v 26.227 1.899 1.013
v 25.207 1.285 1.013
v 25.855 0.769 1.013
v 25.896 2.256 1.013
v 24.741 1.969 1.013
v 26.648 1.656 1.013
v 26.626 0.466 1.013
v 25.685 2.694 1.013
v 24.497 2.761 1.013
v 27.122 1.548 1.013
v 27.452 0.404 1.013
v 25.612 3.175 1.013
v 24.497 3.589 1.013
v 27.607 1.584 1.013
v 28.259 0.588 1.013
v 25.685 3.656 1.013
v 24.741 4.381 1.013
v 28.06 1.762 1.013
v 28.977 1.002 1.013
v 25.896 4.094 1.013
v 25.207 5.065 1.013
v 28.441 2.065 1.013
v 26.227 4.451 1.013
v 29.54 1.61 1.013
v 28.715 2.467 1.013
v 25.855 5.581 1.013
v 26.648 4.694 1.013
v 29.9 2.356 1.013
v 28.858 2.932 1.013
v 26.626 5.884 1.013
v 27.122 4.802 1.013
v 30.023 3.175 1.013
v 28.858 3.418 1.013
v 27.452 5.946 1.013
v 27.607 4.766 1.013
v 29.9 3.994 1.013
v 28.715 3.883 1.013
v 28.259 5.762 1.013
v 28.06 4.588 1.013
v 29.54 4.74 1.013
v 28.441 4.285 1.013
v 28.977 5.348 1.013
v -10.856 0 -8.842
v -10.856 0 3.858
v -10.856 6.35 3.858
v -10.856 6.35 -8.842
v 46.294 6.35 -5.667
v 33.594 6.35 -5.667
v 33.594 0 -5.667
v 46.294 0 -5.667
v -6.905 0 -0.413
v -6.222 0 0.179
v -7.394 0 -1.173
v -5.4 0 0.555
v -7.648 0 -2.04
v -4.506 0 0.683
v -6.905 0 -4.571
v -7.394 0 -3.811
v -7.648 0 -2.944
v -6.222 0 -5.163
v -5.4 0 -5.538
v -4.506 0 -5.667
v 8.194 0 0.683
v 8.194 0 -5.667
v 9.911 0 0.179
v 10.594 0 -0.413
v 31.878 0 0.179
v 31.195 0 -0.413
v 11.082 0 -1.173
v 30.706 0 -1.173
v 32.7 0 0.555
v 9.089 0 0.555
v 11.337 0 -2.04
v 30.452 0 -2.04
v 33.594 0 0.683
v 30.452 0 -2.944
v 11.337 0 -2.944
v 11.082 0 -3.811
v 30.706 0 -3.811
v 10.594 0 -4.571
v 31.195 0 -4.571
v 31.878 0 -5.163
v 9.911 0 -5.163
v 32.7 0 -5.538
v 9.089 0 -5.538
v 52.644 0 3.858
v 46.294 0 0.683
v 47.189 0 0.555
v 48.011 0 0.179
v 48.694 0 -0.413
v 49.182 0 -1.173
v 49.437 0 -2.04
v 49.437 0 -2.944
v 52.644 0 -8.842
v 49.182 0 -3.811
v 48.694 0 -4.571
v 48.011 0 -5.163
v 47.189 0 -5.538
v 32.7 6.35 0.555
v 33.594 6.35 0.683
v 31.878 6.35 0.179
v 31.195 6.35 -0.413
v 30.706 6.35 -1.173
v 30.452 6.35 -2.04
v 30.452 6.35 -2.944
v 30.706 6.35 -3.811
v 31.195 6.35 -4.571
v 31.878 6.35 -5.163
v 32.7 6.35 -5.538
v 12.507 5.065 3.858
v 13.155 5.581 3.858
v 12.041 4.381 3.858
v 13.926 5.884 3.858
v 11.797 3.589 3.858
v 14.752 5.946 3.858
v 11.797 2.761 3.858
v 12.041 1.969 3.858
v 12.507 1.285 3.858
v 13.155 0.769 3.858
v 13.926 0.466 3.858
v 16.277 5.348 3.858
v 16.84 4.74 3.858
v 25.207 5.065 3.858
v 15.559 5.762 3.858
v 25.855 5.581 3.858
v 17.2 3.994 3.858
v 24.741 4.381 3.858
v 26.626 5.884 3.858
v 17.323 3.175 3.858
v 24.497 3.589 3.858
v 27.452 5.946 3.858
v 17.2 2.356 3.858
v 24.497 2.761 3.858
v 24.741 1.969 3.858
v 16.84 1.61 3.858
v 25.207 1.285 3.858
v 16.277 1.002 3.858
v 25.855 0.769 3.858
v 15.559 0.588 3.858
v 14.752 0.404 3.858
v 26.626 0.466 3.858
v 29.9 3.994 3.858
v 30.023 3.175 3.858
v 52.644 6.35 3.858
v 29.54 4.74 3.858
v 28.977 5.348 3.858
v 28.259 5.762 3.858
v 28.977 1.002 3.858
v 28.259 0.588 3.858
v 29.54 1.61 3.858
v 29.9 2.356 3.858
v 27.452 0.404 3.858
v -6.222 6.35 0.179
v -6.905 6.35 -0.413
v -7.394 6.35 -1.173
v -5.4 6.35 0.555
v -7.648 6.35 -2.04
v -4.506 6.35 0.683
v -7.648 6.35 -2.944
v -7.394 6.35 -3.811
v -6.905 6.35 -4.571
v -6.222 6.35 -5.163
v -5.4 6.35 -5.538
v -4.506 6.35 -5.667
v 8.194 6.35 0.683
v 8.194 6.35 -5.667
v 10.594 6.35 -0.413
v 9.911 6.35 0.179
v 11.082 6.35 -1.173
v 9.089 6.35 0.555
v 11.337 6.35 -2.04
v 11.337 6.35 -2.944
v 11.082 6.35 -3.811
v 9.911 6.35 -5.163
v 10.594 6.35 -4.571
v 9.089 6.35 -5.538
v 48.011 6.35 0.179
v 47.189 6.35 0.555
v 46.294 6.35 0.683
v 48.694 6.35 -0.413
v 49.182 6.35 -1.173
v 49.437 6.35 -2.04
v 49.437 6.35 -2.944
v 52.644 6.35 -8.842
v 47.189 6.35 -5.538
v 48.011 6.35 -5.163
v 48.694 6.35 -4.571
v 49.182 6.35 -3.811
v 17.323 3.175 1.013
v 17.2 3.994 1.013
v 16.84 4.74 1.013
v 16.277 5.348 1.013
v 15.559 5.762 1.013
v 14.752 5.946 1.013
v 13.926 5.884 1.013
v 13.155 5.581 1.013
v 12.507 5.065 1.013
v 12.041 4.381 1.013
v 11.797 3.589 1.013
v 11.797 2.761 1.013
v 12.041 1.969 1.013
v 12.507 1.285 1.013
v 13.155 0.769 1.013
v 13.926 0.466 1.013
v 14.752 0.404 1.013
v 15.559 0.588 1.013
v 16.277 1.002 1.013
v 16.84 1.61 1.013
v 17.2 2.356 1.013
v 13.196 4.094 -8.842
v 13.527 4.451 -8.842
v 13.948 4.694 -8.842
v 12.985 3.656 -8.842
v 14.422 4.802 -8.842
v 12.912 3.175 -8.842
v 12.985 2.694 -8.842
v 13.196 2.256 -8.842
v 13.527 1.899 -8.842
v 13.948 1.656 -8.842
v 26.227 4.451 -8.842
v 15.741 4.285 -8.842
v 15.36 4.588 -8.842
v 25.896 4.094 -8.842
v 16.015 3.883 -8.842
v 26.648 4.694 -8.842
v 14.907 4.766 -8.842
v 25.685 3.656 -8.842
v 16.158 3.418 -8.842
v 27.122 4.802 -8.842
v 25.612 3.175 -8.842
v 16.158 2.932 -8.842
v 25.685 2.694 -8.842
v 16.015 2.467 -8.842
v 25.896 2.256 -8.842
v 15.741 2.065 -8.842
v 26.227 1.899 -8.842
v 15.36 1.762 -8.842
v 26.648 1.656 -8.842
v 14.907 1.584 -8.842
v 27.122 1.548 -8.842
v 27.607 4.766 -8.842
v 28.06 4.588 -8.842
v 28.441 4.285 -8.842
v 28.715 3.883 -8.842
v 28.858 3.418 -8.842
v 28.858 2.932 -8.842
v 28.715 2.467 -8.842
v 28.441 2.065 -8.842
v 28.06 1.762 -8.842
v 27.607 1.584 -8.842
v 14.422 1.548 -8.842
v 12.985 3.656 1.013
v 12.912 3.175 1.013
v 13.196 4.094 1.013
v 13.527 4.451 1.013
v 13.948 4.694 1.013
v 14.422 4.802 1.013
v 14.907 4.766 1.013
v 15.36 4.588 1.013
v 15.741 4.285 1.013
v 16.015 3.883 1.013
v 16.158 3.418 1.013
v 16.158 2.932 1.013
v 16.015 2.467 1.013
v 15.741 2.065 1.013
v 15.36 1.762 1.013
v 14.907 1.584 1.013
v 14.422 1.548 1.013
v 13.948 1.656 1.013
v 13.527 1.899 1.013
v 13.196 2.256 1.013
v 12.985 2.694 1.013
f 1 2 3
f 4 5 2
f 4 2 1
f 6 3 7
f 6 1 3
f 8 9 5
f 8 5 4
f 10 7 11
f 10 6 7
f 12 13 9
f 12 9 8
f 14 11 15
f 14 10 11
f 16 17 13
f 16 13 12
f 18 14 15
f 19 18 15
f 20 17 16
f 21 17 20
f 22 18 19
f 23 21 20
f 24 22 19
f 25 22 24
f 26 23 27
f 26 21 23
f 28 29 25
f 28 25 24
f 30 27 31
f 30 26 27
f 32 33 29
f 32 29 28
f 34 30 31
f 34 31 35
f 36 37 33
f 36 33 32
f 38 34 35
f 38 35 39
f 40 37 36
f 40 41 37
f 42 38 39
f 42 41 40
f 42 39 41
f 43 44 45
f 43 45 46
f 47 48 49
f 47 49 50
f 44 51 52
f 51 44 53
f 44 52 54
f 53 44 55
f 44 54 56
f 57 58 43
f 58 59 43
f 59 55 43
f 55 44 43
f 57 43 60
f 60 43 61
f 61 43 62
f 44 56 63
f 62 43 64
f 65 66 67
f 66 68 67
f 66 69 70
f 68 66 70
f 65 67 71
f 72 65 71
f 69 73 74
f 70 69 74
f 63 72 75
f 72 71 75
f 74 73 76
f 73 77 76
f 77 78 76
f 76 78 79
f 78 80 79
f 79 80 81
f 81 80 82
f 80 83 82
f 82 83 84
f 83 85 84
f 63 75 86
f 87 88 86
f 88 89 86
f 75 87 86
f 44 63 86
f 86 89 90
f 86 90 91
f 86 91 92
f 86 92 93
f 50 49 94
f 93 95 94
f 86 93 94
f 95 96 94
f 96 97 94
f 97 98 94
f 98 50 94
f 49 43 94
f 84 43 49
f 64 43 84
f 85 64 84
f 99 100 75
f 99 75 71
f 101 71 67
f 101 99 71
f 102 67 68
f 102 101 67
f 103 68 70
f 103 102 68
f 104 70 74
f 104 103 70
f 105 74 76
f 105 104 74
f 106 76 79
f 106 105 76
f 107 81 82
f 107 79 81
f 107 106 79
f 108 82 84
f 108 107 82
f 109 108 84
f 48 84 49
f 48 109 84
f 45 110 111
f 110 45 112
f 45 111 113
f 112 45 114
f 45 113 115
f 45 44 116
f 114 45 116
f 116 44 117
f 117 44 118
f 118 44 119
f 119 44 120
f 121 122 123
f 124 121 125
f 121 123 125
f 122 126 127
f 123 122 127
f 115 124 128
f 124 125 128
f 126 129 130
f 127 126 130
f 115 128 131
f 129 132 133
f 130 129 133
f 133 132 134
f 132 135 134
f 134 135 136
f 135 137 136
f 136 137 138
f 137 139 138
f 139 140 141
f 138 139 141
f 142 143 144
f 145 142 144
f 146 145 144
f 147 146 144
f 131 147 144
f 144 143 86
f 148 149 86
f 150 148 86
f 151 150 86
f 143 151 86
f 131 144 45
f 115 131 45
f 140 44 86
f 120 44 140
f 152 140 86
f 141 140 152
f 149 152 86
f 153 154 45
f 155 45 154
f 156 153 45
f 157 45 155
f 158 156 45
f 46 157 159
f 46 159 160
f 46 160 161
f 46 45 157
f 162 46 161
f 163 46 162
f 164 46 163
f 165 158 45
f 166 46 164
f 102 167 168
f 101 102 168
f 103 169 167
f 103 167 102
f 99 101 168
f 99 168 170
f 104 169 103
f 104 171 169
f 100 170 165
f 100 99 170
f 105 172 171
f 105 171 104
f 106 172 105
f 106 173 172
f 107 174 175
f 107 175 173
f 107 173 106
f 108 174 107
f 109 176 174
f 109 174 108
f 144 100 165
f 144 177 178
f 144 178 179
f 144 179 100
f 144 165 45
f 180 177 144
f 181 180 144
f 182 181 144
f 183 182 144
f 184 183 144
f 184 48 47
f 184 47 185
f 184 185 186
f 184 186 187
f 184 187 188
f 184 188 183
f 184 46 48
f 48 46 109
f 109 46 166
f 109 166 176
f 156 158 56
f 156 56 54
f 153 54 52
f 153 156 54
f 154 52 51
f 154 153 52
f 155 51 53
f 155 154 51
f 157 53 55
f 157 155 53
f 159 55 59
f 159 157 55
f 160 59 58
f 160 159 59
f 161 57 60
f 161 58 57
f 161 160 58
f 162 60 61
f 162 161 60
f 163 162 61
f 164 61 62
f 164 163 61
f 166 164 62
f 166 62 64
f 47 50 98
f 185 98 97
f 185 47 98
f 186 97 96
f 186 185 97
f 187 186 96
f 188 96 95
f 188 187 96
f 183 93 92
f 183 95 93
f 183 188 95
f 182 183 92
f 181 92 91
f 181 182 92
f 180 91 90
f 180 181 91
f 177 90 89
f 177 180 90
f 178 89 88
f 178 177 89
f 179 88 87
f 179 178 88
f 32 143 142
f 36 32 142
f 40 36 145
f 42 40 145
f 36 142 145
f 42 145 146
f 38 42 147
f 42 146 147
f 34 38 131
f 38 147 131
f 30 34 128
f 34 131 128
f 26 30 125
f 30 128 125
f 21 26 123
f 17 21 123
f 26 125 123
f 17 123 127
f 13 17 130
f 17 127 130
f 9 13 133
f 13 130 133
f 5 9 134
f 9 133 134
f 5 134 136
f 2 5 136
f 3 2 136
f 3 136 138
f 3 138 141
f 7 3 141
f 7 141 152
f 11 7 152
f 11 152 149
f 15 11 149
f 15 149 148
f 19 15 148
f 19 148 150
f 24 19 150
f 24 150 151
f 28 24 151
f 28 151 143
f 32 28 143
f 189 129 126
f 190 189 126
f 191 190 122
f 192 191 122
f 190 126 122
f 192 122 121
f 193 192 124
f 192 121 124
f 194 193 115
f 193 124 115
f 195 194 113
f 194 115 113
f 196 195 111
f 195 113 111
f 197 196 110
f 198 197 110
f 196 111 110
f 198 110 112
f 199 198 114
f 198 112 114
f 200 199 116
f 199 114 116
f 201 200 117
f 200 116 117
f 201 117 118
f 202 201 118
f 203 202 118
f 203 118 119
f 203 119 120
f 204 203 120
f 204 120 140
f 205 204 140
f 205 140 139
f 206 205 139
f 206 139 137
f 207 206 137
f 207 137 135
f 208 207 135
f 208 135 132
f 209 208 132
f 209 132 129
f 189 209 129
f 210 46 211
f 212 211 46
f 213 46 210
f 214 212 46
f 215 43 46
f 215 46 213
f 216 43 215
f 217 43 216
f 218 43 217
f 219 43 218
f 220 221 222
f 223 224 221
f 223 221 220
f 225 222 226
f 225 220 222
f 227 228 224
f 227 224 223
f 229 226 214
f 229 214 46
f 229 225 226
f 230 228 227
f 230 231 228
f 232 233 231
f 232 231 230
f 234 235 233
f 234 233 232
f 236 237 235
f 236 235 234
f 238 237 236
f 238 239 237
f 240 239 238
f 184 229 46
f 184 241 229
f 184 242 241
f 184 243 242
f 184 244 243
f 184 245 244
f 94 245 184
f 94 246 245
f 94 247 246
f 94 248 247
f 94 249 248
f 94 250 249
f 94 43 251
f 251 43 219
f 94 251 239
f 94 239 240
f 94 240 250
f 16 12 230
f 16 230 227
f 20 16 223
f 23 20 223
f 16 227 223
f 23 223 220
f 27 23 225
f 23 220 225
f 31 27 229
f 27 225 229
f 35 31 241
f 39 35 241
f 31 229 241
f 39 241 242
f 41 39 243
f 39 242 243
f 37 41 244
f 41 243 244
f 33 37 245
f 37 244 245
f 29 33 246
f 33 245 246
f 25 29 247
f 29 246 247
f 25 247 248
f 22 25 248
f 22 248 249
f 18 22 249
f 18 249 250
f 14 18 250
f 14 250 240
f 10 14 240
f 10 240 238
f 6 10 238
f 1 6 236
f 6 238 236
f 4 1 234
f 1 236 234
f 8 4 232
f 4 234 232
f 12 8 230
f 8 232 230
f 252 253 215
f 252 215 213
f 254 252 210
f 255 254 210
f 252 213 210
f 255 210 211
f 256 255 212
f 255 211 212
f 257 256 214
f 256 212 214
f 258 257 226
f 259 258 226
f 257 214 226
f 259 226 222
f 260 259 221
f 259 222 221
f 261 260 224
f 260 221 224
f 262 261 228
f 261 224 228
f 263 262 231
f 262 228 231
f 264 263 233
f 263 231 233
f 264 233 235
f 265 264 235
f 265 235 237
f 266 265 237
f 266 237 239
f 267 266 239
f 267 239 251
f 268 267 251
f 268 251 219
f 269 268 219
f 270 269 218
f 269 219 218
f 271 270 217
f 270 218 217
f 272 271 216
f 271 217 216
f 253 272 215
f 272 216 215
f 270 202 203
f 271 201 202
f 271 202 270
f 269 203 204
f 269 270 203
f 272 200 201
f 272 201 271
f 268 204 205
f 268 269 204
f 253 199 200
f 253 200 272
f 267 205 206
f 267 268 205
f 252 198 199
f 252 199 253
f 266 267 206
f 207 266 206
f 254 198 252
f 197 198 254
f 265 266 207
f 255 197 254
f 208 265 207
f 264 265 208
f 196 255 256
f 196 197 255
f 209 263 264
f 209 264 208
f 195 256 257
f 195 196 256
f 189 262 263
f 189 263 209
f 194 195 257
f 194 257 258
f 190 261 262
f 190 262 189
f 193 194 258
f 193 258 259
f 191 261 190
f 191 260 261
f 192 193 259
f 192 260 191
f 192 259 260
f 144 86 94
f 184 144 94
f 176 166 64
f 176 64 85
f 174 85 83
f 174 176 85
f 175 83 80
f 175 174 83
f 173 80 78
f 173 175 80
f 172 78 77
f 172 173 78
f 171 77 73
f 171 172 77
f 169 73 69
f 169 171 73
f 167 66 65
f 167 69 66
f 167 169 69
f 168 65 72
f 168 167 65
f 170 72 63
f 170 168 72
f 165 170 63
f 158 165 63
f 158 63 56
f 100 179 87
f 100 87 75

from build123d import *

# Parameters (mm, degrees)
SKETCH2_W                                      = 63.5
SKETCH2_H                                      = 12.7
BOSS_EXTRUDE1_DEPTH                            = 6.35
CBORE_FOR_4_SOCKET_HEAD_CAP_SCREW1_D           = 3.2639
CBORE_FOR_4_SOCKET_HEAD_CAP_SCREW1_CBORE_D     = 5.55752
CBORE_FOR_4_SOCKET_HEAD_CAP_SCREW1_CBORE_DEPTH = 2.8448
CUT_EXTRUDE1_DEPTH                             = 7.35


with BuildPart() as part:
    # Sketch2 → Boss-Extrude1 (new body)
    with BuildSketch(Plane(origin=(0, 0, 0), x_dir=(1, 0, 0), z_dir=(0, 1, 0))):
        with Locations((20.894224422, 2.49179868)):
            Rectangle(SKETCH2_W, SKETCH2_H)
    extrude(amount=BOSS_EXTRUDE1_DEPTH)

    # CBORE for #4 Socket Head Cap Screw1 (through all)
    with Locations(Plane.XY.offset(3.85820132)):
        with Locations((14.544224422, 3.175), (27.244224422, 3.175)):
            CounterBoreHole(CBORE_FOR_4_SOCKET_HEAD_CAP_SCREW1_D / 2, CBORE_FOR_4_SOCKET_HEAD_CAP_SCREW1_CBORE_D / 2, CBORE_FOR_4_SOCKET_HEAD_CAP_SCREW1_CBORE_DEPTH)

    # Sketch8 → Cut-Extrude1 (cut, through all)
    with BuildSketch(Plane(origin=(0, 6.35, 0), x_dir=(1, 0, 0), z_dir=(0, 1, 0))):
        with BuildLine():
            Line((-4.505775578, 5.66679868), (8.194224422, 5.66679868))
            ThreePointArc((8.194224422, 5.66679868), (11.369224422, 2.49179868), (8.194224422, -0.68320132))
            Line((8.194224422, -0.68320132), (-4.505775578, -0.68320132))
            ThreePointArc((-4.505775578, -0.68320132), (-7.680775578, 2.49179868), (-4.505775578, 5.66679868))
        make_face()
        with BuildLine():
            Line((33.594224422, 5.66679868), (46.294224422, 5.66679868))
            ThreePointArc((46.294224422, 5.66679868), (49.469224422, 2.49179868), (46.294224422, -0.68320132))
            Line((46.294224422, -0.68320132), (33.594224422, -0.68320132))
            ThreePointArc((33.594224422, -0.68320132), (30.419224422, 2.49179868), (33.594224422, 5.66679868))
        make_face()
    extrude(amount=-CUT_EXTRUDE1_DEPTH, mode=Mode.SUBTRACT)


solid = part.part
